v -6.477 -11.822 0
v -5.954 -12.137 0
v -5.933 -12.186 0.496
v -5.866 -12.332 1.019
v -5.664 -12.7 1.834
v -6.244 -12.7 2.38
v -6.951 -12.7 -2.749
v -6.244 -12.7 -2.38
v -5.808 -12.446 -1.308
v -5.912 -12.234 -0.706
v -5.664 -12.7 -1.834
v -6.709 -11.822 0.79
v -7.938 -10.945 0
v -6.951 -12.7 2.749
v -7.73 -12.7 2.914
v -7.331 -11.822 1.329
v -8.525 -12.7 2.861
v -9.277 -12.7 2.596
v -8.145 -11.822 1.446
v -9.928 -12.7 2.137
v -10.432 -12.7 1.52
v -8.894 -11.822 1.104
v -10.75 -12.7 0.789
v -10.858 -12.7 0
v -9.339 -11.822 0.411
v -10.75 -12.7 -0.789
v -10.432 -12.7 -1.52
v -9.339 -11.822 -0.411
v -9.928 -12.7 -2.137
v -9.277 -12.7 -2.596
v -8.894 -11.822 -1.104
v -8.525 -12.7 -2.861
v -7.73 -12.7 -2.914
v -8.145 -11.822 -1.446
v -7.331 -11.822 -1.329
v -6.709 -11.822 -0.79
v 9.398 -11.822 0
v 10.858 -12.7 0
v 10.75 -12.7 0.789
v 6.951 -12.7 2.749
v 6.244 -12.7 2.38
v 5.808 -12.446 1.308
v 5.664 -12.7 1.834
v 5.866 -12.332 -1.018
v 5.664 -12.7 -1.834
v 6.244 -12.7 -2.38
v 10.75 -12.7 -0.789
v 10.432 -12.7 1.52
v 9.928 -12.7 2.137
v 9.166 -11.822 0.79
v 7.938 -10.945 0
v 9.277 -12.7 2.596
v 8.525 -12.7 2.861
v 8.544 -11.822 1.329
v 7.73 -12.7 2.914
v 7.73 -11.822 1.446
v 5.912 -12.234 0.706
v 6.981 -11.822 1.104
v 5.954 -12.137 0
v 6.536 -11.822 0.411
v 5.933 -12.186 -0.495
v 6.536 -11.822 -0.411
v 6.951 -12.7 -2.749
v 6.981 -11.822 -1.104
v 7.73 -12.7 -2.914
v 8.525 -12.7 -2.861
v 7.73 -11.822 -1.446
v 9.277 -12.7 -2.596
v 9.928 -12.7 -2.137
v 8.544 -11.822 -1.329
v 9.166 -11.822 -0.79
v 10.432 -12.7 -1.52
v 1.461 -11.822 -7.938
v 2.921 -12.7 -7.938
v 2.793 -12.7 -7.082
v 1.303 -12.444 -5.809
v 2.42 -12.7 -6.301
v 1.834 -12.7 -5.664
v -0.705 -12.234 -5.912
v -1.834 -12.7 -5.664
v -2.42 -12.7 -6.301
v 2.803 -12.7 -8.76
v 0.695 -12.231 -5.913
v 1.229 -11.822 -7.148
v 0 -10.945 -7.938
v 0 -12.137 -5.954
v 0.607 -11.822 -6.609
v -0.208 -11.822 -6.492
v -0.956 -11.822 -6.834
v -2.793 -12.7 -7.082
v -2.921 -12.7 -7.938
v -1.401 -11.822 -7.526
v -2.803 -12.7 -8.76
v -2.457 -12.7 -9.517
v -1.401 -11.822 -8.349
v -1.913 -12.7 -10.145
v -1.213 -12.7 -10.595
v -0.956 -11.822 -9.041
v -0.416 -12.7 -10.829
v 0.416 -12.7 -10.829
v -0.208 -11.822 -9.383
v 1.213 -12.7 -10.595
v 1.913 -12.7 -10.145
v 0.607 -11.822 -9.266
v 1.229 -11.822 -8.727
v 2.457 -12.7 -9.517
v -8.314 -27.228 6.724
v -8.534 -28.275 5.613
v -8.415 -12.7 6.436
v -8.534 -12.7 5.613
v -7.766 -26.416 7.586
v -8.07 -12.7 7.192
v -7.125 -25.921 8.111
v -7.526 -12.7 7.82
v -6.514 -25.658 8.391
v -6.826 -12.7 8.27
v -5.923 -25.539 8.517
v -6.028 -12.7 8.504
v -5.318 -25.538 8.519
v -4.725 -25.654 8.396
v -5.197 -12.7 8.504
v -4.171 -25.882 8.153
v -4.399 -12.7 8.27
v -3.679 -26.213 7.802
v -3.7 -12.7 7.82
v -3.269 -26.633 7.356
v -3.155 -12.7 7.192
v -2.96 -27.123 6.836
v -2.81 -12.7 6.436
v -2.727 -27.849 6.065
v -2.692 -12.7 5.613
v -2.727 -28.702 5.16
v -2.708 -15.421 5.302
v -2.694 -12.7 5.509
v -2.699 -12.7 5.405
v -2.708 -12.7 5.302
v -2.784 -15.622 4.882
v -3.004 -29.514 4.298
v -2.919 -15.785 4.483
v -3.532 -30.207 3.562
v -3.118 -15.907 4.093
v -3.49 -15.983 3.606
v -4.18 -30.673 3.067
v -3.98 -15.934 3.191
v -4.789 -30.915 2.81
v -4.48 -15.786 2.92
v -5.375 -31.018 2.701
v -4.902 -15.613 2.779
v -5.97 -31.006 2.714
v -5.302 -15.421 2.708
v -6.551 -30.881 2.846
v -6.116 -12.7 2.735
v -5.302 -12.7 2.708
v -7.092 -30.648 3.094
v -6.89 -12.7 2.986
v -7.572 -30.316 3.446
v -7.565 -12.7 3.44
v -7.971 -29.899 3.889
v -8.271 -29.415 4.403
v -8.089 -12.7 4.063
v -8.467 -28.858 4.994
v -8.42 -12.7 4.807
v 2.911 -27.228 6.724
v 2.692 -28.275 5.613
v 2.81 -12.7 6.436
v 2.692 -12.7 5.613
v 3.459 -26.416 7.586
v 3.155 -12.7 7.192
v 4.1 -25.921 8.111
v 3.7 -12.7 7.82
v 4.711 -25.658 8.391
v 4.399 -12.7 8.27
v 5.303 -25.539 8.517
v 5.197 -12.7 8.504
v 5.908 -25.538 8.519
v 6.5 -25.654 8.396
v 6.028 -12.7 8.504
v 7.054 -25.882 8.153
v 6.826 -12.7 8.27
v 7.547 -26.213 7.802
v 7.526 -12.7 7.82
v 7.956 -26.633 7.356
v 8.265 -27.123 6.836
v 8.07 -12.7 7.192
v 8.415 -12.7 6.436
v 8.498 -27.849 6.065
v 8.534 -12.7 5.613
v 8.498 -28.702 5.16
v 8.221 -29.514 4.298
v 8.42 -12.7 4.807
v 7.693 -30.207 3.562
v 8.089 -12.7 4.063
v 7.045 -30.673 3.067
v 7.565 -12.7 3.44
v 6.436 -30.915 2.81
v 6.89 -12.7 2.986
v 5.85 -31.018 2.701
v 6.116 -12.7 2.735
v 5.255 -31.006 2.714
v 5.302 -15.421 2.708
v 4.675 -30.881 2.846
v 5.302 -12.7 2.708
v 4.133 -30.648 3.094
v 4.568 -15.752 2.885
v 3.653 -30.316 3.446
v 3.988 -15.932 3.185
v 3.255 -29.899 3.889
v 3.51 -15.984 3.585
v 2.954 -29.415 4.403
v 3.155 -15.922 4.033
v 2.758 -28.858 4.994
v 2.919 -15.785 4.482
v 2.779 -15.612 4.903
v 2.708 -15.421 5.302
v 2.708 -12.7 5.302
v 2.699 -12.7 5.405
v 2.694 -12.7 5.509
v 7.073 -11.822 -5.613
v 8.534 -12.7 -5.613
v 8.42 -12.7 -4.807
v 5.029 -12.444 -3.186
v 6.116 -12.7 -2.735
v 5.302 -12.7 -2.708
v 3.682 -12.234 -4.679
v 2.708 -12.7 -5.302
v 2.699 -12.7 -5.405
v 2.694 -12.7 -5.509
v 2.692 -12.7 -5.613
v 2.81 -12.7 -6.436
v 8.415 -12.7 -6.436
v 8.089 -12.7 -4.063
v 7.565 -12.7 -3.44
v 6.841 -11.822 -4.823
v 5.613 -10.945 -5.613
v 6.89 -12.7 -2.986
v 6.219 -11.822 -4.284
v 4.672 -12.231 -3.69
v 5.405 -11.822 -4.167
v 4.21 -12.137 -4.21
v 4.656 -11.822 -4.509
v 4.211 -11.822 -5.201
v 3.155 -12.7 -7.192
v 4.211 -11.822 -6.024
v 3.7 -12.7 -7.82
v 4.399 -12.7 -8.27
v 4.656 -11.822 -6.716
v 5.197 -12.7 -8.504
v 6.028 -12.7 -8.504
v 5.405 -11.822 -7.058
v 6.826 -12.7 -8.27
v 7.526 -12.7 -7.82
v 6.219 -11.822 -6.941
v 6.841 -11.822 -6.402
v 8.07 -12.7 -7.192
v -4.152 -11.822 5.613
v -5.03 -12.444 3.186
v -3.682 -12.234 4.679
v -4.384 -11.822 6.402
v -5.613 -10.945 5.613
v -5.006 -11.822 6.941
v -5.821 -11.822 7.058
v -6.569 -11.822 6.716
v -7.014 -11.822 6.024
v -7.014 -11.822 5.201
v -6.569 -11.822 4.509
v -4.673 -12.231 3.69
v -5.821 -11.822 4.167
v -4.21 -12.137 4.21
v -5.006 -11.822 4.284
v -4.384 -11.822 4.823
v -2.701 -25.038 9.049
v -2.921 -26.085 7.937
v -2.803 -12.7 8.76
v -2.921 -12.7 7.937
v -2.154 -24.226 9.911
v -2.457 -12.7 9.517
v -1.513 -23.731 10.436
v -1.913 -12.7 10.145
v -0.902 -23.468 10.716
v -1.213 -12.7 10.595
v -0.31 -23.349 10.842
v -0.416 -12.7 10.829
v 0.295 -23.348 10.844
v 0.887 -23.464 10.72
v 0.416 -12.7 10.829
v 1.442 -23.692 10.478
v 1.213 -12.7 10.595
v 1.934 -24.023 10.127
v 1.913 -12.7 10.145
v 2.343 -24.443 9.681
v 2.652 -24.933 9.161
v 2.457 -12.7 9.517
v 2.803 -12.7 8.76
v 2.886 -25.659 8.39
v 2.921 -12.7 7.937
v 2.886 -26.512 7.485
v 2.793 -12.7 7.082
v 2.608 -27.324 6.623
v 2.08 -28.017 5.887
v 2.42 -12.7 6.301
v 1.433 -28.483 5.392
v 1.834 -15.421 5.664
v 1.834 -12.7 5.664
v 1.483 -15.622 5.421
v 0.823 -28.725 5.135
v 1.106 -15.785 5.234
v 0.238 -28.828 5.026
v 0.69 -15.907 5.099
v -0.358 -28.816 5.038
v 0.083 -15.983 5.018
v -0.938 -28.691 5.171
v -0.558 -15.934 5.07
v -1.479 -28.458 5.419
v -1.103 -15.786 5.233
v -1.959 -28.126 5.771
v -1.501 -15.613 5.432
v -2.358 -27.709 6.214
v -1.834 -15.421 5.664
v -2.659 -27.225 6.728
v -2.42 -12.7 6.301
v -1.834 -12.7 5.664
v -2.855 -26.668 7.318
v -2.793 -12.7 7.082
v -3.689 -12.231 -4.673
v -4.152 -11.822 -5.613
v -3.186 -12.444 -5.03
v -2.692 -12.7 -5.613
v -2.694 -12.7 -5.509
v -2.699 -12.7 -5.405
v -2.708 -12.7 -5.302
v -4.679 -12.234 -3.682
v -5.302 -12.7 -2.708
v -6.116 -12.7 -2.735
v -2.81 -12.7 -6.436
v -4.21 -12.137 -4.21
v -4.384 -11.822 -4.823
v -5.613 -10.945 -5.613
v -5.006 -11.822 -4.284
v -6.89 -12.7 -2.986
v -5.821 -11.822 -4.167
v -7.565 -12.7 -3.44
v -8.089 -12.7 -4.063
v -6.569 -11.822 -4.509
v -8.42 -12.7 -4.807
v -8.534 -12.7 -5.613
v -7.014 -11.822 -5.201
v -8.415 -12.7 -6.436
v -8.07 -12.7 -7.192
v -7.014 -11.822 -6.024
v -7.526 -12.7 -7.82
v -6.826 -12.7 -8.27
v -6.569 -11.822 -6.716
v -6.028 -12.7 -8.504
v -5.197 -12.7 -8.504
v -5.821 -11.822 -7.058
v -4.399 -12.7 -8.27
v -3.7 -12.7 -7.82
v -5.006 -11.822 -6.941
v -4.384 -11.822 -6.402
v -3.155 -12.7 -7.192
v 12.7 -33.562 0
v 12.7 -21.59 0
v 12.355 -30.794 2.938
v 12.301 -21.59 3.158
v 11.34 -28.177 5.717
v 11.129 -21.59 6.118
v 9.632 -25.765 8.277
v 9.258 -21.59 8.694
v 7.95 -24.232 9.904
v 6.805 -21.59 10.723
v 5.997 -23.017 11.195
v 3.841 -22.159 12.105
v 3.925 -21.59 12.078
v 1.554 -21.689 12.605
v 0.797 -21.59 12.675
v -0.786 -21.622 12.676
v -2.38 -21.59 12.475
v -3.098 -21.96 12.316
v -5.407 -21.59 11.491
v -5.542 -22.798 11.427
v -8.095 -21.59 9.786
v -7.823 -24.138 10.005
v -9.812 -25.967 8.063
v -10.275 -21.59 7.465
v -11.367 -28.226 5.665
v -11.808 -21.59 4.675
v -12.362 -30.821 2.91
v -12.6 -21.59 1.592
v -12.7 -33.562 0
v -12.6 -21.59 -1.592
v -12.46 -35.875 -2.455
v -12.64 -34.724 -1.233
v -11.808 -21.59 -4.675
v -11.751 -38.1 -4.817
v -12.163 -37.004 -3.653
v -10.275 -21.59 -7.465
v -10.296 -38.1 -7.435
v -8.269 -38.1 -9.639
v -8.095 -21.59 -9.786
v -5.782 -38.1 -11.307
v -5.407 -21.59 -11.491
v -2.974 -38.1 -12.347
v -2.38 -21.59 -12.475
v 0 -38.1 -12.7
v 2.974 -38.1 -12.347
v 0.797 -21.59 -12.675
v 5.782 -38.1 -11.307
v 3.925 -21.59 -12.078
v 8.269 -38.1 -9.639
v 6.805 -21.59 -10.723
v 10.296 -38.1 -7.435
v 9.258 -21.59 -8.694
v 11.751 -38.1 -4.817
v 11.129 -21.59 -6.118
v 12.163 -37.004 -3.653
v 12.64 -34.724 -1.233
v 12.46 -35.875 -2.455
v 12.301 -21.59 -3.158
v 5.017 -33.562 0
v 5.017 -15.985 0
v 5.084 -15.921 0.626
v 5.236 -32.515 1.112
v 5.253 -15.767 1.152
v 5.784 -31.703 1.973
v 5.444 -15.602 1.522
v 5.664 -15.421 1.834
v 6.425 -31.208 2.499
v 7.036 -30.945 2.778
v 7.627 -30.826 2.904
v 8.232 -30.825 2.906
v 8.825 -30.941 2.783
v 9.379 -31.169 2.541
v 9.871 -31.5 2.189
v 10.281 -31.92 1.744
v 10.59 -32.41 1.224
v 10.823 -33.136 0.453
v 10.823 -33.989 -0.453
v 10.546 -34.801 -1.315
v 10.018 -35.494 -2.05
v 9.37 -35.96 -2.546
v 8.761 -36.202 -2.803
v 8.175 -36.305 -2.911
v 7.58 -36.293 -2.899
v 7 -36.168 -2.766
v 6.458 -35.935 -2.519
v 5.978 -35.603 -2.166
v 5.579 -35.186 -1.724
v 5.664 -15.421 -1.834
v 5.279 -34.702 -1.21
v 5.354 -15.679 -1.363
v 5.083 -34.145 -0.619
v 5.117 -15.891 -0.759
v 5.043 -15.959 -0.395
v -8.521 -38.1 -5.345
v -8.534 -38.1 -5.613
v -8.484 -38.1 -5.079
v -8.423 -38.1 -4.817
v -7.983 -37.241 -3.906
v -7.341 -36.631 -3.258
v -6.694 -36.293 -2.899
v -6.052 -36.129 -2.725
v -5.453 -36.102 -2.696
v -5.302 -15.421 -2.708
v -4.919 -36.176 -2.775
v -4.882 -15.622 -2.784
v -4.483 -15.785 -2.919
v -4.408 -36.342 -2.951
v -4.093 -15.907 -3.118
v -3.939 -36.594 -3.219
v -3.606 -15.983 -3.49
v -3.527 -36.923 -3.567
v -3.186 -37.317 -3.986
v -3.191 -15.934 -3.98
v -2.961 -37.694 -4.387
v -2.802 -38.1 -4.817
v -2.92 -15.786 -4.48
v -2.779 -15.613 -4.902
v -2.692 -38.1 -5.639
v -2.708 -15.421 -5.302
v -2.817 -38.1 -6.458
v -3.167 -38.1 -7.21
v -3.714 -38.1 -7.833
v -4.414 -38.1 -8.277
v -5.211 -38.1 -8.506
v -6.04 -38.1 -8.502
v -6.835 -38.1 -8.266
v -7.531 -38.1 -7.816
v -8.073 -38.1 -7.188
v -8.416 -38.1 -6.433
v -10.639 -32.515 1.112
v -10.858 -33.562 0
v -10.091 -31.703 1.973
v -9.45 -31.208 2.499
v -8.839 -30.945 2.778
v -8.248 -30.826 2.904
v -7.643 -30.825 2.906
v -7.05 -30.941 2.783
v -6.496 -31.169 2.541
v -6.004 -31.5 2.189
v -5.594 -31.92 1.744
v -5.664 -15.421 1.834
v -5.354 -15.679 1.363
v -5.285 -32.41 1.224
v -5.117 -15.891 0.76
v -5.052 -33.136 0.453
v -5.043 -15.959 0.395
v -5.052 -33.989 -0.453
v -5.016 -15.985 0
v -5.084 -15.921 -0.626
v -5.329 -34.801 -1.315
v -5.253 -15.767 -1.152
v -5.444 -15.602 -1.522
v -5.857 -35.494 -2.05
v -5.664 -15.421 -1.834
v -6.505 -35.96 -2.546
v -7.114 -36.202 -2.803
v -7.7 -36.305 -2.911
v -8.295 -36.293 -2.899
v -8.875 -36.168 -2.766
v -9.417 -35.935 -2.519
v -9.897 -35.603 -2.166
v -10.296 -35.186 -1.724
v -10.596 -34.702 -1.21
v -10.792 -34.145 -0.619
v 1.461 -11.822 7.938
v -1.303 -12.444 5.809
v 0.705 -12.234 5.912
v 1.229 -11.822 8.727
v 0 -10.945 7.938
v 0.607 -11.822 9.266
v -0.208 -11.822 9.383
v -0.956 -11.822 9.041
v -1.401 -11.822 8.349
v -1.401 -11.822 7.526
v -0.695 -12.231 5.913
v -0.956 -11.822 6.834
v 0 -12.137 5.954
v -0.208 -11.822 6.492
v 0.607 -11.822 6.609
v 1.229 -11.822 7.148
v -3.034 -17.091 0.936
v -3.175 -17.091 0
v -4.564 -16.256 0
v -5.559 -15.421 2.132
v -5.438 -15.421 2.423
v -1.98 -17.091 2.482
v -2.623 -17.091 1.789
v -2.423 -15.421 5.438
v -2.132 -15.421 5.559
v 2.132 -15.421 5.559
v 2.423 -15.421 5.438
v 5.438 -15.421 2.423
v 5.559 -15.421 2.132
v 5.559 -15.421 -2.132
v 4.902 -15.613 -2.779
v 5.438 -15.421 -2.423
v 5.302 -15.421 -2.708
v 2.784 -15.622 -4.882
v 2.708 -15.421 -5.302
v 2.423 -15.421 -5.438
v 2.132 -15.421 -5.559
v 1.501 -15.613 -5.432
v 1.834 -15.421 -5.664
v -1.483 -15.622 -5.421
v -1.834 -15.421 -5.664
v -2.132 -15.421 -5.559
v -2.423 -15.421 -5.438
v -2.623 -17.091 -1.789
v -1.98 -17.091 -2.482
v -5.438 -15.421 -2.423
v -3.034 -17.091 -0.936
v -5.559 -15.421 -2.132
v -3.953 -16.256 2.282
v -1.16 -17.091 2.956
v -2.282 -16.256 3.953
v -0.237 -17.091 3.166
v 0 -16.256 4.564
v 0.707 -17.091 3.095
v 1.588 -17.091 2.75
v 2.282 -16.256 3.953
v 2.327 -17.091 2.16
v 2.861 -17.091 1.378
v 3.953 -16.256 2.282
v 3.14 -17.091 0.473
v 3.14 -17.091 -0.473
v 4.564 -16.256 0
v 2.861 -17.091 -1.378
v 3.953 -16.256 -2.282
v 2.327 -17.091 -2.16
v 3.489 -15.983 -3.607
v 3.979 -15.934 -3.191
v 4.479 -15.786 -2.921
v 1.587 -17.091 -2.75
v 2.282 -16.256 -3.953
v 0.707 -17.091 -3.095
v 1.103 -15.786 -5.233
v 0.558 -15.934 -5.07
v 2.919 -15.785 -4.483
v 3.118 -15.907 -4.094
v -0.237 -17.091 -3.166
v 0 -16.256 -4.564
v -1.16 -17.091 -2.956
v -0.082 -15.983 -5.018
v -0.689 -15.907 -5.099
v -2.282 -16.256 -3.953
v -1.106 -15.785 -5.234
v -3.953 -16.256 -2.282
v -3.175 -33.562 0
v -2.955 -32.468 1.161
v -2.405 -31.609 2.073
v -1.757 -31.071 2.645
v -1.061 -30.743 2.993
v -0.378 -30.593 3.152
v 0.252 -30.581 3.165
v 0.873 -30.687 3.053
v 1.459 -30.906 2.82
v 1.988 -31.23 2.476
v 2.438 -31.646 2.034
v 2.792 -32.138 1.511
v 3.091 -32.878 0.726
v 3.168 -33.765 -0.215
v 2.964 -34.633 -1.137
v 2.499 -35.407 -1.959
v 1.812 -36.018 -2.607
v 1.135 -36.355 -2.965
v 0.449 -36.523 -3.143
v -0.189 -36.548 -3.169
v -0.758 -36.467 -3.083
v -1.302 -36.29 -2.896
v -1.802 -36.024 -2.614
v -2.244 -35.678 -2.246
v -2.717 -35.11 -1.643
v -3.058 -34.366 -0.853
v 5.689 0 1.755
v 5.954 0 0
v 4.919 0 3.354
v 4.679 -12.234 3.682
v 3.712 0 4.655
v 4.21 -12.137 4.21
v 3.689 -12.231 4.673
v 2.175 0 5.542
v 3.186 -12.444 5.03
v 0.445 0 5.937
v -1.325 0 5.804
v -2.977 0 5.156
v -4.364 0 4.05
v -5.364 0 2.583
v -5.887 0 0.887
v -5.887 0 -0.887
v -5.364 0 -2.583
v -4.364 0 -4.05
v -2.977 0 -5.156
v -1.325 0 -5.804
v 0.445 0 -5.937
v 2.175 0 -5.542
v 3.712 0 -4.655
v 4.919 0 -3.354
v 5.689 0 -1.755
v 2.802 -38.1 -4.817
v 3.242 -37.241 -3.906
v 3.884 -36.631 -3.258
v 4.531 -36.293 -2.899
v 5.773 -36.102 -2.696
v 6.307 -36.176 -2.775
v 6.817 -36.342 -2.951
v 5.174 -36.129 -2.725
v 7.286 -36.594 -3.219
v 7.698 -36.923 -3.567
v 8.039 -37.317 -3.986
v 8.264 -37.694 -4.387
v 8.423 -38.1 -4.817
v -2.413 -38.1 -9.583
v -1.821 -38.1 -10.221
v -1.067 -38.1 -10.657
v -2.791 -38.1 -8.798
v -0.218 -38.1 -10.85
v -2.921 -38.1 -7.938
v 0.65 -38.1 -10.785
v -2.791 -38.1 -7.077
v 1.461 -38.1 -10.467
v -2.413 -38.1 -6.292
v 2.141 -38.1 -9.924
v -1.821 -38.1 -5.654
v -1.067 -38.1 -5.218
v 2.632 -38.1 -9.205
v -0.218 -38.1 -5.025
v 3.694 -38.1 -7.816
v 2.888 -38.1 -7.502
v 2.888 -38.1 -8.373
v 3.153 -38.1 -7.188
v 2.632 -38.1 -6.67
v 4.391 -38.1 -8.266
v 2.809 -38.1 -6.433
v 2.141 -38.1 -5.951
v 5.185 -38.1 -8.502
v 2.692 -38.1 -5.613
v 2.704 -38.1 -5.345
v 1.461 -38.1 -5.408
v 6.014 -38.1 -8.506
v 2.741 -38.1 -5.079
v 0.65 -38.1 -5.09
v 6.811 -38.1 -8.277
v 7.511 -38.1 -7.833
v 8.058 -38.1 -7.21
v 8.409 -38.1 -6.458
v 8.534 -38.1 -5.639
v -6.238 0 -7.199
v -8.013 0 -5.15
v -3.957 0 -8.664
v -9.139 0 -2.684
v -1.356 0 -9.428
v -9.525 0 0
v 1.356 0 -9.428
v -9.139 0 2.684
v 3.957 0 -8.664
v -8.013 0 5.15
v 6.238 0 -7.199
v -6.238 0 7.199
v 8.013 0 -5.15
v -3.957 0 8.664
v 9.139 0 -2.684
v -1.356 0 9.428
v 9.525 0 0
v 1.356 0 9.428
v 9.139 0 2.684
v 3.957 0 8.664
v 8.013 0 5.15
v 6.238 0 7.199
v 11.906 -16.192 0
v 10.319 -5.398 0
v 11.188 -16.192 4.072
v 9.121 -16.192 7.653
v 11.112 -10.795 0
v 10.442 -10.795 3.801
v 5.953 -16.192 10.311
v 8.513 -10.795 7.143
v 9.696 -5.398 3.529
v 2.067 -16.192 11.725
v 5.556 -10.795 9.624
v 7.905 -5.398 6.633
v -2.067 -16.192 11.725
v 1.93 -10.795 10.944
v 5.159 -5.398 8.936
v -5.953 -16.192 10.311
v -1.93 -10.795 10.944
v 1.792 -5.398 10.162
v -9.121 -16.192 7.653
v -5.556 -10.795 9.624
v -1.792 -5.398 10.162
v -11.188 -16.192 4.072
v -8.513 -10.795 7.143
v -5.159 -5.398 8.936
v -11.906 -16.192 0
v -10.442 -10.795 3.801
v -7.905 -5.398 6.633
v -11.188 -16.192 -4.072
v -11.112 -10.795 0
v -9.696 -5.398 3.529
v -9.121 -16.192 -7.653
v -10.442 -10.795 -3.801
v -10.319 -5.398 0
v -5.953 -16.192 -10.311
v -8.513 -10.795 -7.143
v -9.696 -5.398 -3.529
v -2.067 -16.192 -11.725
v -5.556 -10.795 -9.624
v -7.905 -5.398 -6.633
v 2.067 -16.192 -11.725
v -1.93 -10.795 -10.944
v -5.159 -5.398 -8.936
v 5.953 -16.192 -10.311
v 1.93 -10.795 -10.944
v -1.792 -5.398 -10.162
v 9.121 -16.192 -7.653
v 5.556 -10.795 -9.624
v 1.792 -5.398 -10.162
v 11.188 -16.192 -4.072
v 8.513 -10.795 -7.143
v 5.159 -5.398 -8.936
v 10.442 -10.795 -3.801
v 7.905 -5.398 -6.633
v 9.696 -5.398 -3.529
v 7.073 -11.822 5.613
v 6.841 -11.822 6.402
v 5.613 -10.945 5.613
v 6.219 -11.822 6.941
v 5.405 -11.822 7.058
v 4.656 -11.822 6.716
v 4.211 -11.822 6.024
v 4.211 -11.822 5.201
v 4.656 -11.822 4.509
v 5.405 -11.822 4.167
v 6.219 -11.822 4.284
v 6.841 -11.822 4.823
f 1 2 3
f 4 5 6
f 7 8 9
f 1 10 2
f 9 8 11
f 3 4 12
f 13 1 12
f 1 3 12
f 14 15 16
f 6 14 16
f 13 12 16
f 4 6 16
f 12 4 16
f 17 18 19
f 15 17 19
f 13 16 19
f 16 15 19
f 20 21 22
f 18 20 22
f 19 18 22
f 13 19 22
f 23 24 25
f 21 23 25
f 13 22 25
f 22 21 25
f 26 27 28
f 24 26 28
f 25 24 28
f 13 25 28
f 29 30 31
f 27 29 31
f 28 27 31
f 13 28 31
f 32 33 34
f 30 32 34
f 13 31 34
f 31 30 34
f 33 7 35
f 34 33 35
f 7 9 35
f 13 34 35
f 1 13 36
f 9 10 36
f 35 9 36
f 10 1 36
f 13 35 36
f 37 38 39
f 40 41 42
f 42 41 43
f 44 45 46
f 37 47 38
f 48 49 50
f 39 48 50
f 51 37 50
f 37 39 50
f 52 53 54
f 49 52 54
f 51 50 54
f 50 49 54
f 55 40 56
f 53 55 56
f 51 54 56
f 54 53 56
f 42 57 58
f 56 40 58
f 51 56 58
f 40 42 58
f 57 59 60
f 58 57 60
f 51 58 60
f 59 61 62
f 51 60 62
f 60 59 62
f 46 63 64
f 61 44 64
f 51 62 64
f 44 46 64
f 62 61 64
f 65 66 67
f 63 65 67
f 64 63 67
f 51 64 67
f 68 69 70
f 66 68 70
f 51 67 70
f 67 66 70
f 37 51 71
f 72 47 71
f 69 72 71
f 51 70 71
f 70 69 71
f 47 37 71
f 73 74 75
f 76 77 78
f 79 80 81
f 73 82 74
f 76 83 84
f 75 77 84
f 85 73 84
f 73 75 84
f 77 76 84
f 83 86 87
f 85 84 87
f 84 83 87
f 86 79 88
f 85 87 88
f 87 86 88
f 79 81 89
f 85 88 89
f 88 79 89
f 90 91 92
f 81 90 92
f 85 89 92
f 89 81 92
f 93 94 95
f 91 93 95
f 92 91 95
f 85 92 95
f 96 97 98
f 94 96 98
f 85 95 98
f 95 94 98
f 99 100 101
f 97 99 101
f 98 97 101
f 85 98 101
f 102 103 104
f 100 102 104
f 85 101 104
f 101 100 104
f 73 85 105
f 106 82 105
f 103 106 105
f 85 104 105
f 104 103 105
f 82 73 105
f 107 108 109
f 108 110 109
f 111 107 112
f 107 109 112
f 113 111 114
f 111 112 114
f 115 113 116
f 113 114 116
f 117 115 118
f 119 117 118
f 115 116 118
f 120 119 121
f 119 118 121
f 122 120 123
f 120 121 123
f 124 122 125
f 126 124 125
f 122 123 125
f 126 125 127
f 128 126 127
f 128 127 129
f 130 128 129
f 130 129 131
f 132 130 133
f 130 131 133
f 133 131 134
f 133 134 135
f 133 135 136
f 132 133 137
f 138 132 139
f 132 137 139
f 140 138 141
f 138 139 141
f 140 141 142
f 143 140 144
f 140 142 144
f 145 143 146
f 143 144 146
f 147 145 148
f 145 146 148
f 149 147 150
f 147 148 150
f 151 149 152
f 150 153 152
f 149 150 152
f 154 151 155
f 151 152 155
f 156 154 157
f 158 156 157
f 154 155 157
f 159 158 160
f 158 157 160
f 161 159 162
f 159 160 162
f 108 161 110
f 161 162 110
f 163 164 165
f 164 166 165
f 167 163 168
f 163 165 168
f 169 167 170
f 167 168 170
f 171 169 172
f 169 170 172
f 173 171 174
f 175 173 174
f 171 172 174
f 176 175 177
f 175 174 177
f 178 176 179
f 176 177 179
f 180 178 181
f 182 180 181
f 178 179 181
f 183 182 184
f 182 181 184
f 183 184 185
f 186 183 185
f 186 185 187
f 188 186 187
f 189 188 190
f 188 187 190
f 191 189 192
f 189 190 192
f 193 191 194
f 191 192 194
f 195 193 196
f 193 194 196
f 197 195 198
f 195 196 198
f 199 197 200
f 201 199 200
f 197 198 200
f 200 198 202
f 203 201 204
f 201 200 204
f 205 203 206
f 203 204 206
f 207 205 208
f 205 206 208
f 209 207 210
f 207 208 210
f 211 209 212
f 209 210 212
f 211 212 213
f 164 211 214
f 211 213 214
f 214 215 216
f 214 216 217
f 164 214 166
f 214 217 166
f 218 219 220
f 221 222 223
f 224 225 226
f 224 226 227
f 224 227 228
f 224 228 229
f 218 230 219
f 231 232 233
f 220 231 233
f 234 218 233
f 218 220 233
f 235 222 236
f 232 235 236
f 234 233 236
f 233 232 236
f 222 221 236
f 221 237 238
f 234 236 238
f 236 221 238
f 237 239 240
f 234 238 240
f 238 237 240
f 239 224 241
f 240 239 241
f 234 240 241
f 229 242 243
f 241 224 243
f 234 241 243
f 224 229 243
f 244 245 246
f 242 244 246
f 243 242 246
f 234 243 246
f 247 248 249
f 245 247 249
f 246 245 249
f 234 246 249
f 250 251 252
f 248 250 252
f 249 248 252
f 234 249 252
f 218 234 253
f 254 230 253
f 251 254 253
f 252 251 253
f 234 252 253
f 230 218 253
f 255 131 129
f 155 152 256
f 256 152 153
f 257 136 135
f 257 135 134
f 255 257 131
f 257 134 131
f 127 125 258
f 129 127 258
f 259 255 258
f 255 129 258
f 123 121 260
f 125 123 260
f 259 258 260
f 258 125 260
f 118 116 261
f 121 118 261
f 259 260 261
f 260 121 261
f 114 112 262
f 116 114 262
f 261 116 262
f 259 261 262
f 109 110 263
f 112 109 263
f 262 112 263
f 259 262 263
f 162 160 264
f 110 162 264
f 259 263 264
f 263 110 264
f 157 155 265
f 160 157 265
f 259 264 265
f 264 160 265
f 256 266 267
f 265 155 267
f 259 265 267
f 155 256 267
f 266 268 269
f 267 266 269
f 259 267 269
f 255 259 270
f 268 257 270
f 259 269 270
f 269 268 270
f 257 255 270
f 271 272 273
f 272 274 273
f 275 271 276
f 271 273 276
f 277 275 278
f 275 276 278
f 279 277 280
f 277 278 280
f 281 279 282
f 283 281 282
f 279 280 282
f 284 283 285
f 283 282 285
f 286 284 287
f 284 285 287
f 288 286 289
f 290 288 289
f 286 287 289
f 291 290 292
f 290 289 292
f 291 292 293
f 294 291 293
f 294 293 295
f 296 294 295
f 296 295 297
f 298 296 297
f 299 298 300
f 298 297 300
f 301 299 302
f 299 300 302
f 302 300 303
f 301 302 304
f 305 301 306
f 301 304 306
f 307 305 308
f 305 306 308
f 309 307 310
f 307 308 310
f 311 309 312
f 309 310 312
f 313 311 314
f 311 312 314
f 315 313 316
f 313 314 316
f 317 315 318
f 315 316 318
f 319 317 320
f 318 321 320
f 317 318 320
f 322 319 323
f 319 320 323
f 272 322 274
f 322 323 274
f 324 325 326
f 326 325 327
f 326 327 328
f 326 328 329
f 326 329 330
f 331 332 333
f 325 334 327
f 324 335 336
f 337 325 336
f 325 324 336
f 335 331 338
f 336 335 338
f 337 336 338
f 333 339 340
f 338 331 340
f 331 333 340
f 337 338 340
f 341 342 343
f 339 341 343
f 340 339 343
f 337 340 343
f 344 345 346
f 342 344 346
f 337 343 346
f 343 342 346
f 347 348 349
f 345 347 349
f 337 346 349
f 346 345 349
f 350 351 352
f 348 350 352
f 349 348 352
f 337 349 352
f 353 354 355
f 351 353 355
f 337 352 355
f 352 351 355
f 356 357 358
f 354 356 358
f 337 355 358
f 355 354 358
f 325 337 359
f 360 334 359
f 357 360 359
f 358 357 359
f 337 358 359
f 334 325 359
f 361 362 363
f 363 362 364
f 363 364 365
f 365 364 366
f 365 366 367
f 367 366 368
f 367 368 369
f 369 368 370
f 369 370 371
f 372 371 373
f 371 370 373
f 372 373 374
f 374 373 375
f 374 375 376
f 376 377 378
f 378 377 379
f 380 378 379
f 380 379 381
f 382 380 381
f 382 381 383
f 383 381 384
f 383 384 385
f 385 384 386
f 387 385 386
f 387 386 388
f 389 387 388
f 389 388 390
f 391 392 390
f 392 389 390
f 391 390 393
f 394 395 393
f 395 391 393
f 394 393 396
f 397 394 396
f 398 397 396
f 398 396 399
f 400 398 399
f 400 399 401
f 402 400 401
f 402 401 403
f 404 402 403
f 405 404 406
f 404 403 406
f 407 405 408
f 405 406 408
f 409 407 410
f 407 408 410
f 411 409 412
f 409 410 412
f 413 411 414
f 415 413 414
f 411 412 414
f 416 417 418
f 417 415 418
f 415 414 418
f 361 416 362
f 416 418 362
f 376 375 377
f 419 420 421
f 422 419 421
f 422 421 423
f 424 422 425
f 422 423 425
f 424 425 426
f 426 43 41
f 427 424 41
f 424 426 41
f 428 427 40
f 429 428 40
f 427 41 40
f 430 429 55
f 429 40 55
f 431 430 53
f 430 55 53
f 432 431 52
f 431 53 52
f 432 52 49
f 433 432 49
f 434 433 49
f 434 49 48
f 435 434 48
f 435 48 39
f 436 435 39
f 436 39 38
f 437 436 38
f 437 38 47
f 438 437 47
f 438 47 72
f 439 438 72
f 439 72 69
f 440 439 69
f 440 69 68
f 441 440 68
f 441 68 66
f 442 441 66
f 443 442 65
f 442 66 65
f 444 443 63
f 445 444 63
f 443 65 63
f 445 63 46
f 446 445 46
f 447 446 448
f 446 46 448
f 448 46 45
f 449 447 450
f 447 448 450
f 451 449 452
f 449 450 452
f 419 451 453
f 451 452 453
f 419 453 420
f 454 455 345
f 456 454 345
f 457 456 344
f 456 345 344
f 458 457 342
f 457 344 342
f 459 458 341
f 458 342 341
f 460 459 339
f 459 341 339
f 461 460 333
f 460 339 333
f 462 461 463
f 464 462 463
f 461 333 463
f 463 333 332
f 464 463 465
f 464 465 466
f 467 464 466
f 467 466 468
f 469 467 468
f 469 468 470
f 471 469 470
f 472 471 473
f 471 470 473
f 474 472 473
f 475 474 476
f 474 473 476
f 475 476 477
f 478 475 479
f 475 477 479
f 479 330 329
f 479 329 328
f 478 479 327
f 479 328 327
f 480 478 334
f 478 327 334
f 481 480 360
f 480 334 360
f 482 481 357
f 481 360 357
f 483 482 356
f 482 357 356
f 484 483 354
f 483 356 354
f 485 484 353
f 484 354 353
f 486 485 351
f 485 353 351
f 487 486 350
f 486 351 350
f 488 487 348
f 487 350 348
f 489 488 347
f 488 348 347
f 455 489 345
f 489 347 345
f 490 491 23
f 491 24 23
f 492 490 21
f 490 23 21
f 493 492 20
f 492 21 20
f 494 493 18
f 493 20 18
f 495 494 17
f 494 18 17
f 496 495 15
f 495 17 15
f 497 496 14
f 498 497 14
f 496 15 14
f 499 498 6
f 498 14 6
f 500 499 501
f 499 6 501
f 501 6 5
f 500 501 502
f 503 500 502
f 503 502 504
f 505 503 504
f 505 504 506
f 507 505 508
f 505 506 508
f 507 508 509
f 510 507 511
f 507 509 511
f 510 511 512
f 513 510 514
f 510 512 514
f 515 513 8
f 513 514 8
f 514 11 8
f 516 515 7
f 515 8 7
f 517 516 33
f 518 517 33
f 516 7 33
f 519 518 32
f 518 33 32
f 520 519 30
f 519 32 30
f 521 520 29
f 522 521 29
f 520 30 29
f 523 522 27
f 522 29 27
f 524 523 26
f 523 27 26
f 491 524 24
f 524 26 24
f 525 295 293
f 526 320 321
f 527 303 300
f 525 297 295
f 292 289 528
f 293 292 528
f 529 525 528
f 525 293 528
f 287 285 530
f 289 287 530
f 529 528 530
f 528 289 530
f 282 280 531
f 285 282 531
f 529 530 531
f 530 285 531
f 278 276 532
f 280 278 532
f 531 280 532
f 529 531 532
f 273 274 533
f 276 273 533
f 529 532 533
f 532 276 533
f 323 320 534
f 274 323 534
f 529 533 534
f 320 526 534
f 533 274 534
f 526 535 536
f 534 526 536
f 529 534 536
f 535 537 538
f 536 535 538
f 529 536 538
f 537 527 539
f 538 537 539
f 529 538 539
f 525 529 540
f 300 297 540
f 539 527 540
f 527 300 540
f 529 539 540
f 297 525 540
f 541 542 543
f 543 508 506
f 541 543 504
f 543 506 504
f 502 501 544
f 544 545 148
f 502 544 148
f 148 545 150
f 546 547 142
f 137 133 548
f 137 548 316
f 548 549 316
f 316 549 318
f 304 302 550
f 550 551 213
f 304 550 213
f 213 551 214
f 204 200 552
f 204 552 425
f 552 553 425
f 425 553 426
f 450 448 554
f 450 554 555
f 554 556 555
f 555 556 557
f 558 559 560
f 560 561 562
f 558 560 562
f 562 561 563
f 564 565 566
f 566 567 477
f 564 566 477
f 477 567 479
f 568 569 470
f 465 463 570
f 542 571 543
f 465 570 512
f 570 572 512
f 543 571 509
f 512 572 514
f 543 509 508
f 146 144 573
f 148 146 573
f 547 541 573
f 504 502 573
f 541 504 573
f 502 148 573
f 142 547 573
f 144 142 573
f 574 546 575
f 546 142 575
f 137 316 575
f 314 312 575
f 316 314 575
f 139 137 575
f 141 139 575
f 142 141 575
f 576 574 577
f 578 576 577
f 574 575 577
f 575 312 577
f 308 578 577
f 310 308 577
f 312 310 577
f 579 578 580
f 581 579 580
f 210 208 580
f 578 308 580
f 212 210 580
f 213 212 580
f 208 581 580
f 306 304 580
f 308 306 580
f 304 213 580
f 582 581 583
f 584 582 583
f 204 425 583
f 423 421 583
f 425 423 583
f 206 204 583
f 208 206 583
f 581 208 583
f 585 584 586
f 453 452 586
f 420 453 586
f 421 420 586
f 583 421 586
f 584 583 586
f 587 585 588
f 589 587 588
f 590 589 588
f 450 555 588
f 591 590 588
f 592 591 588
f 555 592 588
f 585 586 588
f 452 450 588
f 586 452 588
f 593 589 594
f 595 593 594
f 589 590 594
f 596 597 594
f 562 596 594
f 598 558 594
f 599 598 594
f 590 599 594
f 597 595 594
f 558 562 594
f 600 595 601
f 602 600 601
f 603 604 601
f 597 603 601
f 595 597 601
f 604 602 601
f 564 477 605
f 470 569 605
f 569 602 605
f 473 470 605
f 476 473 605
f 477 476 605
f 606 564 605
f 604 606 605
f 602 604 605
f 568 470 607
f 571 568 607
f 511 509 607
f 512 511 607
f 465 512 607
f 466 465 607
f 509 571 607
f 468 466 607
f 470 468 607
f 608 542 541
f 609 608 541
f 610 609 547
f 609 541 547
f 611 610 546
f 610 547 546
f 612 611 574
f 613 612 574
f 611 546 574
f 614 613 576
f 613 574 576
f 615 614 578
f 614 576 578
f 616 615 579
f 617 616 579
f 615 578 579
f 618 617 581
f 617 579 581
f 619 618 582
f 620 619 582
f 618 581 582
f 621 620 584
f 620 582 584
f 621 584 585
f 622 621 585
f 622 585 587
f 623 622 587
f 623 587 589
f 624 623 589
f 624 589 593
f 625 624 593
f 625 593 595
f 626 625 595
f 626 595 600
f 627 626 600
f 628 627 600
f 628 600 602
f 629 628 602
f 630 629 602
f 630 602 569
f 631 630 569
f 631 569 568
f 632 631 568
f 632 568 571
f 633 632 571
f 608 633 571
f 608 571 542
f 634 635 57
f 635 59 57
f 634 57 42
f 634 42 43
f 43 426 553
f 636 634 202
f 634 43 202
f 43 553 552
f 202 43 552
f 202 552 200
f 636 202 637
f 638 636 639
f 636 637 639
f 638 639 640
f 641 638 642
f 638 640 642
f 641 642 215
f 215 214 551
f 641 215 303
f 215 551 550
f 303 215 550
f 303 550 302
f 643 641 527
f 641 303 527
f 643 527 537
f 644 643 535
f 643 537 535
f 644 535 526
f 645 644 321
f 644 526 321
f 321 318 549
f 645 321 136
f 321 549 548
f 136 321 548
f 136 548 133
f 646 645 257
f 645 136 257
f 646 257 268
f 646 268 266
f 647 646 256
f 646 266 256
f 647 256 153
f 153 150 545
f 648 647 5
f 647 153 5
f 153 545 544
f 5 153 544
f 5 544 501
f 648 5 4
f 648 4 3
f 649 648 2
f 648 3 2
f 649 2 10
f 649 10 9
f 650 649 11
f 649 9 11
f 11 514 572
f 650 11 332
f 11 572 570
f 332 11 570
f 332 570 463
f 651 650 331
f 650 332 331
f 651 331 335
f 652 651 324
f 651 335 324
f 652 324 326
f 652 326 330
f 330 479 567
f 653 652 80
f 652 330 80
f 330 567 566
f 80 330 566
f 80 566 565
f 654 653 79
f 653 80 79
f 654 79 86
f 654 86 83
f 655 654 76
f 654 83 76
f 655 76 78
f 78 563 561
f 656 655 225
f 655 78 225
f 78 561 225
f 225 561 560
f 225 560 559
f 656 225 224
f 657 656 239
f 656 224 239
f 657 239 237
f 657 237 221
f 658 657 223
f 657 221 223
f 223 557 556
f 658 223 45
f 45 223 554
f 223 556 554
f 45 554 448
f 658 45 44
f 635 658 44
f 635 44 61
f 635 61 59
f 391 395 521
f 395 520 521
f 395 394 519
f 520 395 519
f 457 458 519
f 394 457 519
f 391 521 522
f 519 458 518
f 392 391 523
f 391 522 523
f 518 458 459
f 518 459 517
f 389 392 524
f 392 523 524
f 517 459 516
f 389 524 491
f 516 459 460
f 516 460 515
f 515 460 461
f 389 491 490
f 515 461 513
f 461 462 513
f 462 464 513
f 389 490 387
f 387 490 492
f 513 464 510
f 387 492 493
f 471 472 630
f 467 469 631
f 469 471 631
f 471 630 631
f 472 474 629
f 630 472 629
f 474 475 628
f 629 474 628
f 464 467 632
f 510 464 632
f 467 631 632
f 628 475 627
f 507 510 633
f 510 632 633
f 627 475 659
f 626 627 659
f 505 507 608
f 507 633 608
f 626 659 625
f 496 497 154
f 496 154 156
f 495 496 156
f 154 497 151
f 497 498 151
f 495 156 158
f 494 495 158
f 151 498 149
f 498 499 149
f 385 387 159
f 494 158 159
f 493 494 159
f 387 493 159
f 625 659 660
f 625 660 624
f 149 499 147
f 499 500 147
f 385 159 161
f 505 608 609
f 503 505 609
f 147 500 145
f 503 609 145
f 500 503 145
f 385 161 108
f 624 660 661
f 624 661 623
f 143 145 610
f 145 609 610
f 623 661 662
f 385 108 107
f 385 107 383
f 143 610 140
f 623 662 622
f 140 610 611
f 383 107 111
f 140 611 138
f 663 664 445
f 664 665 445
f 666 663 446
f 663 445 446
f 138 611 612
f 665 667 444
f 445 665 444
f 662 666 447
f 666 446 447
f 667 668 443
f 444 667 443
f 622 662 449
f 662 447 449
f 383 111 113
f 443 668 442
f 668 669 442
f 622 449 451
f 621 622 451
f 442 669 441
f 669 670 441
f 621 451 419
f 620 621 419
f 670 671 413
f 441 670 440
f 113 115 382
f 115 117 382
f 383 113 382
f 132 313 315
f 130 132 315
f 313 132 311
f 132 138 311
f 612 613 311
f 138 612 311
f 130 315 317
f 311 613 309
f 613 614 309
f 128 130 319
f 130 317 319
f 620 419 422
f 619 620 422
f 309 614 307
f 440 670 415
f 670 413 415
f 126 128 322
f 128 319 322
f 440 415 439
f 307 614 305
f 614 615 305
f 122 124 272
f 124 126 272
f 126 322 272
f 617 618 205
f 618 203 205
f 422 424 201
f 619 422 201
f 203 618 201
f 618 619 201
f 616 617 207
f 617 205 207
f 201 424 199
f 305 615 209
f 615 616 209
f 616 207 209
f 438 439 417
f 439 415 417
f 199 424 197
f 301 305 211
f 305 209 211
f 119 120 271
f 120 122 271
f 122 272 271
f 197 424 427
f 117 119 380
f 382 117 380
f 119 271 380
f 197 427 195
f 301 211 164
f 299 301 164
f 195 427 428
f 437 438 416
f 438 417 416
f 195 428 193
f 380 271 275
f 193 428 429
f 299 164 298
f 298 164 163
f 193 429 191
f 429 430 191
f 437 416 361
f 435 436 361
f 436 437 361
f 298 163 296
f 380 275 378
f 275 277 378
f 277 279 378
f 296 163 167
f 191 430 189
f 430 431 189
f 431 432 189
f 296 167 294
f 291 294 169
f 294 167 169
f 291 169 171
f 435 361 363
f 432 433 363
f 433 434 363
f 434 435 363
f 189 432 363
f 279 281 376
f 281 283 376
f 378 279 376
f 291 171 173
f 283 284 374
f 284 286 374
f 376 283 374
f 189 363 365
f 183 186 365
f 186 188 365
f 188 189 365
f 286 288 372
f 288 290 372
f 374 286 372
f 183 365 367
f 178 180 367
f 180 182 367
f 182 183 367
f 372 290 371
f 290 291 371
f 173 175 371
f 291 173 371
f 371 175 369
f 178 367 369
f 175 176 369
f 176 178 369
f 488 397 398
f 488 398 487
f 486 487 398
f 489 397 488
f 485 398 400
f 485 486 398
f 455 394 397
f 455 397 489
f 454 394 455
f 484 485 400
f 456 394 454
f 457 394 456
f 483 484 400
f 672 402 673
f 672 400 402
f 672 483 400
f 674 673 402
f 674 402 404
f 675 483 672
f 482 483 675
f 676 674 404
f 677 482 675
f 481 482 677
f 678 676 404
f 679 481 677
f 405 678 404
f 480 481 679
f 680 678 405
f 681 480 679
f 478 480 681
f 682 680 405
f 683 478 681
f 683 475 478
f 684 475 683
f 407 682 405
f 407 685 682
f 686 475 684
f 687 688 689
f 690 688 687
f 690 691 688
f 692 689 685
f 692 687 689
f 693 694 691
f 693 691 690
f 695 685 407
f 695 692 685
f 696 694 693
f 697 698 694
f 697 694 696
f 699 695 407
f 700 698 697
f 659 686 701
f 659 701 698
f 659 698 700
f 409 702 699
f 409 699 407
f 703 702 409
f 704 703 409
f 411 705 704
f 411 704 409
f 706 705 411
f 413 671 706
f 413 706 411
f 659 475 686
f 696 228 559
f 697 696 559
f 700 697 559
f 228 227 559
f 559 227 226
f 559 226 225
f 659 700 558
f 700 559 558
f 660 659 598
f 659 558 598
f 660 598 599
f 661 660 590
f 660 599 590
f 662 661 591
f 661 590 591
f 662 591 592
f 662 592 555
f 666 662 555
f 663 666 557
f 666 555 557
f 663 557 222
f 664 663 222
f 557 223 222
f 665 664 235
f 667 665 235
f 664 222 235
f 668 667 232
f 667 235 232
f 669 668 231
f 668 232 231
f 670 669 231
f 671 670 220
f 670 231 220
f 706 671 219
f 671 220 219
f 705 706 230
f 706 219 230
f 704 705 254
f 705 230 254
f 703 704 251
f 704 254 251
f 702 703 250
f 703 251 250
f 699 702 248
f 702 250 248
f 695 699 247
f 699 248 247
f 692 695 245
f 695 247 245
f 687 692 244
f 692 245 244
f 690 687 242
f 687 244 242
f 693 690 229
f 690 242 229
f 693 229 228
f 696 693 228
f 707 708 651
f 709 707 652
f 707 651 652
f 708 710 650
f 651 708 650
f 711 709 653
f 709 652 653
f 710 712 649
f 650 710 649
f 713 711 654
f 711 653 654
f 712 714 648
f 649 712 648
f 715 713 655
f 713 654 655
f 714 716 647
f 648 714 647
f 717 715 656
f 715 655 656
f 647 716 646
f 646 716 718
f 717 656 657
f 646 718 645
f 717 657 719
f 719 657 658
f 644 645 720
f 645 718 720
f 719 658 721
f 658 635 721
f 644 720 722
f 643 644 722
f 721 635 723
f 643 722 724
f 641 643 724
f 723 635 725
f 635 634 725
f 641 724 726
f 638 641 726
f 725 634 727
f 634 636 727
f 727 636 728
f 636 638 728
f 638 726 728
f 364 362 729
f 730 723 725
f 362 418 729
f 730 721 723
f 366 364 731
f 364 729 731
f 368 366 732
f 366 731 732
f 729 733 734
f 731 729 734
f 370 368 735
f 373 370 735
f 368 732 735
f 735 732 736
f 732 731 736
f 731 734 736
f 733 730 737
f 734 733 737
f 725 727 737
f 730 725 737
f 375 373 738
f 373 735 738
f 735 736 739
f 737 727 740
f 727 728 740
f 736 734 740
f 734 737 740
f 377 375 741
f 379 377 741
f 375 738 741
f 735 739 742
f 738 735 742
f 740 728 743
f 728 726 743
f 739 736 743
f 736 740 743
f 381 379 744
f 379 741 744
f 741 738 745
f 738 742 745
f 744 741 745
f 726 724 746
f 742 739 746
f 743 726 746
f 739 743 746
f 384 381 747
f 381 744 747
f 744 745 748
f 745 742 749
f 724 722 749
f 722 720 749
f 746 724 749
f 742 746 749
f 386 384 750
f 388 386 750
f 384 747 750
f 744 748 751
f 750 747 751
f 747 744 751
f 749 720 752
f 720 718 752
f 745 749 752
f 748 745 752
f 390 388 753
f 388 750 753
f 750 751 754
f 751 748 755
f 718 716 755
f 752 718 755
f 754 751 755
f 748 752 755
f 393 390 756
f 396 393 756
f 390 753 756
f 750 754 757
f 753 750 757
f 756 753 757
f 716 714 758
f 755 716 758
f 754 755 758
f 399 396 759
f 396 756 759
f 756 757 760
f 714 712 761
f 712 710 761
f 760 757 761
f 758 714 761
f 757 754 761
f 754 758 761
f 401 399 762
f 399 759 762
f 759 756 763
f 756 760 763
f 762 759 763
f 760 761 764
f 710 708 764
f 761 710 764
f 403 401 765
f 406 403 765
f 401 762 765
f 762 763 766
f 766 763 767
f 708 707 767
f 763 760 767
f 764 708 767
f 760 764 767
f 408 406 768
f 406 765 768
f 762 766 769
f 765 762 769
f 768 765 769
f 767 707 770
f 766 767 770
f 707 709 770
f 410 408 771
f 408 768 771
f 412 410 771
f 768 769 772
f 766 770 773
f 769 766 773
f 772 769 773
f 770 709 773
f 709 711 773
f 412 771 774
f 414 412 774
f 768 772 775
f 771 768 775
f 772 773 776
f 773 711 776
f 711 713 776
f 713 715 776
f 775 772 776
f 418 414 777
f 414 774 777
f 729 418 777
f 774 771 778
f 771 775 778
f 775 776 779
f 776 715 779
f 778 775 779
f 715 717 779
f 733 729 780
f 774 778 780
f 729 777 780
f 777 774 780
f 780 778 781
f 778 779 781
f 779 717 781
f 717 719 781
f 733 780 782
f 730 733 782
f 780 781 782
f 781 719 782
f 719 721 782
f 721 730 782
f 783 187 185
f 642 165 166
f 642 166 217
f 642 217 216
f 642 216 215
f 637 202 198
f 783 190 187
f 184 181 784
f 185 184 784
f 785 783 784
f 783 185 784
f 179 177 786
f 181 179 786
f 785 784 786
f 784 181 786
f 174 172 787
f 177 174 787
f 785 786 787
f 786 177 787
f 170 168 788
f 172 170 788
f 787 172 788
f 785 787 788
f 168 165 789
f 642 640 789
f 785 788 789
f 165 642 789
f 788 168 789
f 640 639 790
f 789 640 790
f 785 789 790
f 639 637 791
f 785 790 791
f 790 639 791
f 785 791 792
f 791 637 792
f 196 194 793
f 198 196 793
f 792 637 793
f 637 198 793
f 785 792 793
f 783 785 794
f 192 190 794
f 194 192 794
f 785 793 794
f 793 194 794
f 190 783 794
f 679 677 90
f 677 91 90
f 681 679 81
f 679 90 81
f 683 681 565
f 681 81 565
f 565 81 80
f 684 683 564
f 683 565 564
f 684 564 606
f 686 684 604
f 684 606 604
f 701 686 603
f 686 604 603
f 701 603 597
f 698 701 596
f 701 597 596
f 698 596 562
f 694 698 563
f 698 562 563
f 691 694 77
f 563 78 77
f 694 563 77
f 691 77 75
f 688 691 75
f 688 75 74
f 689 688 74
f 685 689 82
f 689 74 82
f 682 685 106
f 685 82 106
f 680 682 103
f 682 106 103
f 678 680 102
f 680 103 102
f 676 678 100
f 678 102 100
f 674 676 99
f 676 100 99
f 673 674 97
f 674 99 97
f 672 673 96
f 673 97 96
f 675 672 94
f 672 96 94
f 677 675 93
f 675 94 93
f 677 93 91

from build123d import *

# Parameters (mm, degrees)
F0_R      = 12.7
F1_DEPTH  = 38.1
F3_D      = 11.90752
F3_DEPTH  = 15.4214285714
F3_TIP    = 3.5773799191
F5_D      = 6.35
F7_D      = 5.842
F7_DEPTH  = 25.4
F7_TIP    = 1.7551138682
F11_SIZE2 = 3.175
F11_SIZE  = 21.59
F13_DEPTH = 12.7


with BuildPart() as f1:
    # F0 (on Front) → F1 (new body)
    with BuildSketch(Plane.XZ):
        Circle(F0_R)
    extrude(amount=F1_DEPTH)

    # F3
    with Locations(Plane(origin=(0, 0, 0), x_dir=(-1, 0, 0), z_dir=(0, 1, 0))):
        with Locations((0, 0)):
            Hole(F3_D / 2, depth=F3_DEPTH)
            with Locations((0, 0, -(F3_DEPTH + F3_TIP / 2))):  # 118° drill point
                Cone(0, F3_D / 2, F3_TIP, mode=Mode.SUBTRACT)

    # F5 (through all)
    with Locations(Plane.XZ.offset(38.1)):
        with Locations((0, 0)):
            Hole(F5_D / 2)

    # F7
    with Locations(Plane.XZ.offset(38.1)):
        with Locations((0, 7.9375), (-5.6126600757, 5.6126600757), (-7.9375, 0), (-5.6126600757, -5.6126600757), (0, -7.9375), (5.6126600757, -5.6126600757), (7.9375, 0), (5.6126600757, 5.6126600757)):
            Hole(F7_D / 2, depth=F7_DEPTH)
            with Locations((0, 0, -(F7_DEPTH + F7_TIP / 2))):  # 118° drill point
                Cone(0, F7_D / 2, F7_TIP, mode=Mode.SUBTRACT)

    # F11
    f11_edges = [f1.edges().sort_by_distance(p)[0] for p in [
        (-12.7, 0, 0),
    ]]
    f11_side = f1.faces().sort_by_distance((-12.7, -19.05, 0))[0]
    chamfer(f11_edges, length=F11_SIZE, length2=F11_SIZE2, reference=f11_side)

    # F12 (on Right) → F13 (cut, symmetric)
    with BuildSketch(Plane.YZ):
        Polygon((-43.4335693717, -3.8883644156), (-38.1641536951, -4.8853410408), (-19.5609088987, 14.8634454235), (-39.1272343695, 17.5419766456), align=None)
    extrude(amount=F13_DEPTH, both=True, mode=Mode.SUBTRACT)


solid = f1.part
